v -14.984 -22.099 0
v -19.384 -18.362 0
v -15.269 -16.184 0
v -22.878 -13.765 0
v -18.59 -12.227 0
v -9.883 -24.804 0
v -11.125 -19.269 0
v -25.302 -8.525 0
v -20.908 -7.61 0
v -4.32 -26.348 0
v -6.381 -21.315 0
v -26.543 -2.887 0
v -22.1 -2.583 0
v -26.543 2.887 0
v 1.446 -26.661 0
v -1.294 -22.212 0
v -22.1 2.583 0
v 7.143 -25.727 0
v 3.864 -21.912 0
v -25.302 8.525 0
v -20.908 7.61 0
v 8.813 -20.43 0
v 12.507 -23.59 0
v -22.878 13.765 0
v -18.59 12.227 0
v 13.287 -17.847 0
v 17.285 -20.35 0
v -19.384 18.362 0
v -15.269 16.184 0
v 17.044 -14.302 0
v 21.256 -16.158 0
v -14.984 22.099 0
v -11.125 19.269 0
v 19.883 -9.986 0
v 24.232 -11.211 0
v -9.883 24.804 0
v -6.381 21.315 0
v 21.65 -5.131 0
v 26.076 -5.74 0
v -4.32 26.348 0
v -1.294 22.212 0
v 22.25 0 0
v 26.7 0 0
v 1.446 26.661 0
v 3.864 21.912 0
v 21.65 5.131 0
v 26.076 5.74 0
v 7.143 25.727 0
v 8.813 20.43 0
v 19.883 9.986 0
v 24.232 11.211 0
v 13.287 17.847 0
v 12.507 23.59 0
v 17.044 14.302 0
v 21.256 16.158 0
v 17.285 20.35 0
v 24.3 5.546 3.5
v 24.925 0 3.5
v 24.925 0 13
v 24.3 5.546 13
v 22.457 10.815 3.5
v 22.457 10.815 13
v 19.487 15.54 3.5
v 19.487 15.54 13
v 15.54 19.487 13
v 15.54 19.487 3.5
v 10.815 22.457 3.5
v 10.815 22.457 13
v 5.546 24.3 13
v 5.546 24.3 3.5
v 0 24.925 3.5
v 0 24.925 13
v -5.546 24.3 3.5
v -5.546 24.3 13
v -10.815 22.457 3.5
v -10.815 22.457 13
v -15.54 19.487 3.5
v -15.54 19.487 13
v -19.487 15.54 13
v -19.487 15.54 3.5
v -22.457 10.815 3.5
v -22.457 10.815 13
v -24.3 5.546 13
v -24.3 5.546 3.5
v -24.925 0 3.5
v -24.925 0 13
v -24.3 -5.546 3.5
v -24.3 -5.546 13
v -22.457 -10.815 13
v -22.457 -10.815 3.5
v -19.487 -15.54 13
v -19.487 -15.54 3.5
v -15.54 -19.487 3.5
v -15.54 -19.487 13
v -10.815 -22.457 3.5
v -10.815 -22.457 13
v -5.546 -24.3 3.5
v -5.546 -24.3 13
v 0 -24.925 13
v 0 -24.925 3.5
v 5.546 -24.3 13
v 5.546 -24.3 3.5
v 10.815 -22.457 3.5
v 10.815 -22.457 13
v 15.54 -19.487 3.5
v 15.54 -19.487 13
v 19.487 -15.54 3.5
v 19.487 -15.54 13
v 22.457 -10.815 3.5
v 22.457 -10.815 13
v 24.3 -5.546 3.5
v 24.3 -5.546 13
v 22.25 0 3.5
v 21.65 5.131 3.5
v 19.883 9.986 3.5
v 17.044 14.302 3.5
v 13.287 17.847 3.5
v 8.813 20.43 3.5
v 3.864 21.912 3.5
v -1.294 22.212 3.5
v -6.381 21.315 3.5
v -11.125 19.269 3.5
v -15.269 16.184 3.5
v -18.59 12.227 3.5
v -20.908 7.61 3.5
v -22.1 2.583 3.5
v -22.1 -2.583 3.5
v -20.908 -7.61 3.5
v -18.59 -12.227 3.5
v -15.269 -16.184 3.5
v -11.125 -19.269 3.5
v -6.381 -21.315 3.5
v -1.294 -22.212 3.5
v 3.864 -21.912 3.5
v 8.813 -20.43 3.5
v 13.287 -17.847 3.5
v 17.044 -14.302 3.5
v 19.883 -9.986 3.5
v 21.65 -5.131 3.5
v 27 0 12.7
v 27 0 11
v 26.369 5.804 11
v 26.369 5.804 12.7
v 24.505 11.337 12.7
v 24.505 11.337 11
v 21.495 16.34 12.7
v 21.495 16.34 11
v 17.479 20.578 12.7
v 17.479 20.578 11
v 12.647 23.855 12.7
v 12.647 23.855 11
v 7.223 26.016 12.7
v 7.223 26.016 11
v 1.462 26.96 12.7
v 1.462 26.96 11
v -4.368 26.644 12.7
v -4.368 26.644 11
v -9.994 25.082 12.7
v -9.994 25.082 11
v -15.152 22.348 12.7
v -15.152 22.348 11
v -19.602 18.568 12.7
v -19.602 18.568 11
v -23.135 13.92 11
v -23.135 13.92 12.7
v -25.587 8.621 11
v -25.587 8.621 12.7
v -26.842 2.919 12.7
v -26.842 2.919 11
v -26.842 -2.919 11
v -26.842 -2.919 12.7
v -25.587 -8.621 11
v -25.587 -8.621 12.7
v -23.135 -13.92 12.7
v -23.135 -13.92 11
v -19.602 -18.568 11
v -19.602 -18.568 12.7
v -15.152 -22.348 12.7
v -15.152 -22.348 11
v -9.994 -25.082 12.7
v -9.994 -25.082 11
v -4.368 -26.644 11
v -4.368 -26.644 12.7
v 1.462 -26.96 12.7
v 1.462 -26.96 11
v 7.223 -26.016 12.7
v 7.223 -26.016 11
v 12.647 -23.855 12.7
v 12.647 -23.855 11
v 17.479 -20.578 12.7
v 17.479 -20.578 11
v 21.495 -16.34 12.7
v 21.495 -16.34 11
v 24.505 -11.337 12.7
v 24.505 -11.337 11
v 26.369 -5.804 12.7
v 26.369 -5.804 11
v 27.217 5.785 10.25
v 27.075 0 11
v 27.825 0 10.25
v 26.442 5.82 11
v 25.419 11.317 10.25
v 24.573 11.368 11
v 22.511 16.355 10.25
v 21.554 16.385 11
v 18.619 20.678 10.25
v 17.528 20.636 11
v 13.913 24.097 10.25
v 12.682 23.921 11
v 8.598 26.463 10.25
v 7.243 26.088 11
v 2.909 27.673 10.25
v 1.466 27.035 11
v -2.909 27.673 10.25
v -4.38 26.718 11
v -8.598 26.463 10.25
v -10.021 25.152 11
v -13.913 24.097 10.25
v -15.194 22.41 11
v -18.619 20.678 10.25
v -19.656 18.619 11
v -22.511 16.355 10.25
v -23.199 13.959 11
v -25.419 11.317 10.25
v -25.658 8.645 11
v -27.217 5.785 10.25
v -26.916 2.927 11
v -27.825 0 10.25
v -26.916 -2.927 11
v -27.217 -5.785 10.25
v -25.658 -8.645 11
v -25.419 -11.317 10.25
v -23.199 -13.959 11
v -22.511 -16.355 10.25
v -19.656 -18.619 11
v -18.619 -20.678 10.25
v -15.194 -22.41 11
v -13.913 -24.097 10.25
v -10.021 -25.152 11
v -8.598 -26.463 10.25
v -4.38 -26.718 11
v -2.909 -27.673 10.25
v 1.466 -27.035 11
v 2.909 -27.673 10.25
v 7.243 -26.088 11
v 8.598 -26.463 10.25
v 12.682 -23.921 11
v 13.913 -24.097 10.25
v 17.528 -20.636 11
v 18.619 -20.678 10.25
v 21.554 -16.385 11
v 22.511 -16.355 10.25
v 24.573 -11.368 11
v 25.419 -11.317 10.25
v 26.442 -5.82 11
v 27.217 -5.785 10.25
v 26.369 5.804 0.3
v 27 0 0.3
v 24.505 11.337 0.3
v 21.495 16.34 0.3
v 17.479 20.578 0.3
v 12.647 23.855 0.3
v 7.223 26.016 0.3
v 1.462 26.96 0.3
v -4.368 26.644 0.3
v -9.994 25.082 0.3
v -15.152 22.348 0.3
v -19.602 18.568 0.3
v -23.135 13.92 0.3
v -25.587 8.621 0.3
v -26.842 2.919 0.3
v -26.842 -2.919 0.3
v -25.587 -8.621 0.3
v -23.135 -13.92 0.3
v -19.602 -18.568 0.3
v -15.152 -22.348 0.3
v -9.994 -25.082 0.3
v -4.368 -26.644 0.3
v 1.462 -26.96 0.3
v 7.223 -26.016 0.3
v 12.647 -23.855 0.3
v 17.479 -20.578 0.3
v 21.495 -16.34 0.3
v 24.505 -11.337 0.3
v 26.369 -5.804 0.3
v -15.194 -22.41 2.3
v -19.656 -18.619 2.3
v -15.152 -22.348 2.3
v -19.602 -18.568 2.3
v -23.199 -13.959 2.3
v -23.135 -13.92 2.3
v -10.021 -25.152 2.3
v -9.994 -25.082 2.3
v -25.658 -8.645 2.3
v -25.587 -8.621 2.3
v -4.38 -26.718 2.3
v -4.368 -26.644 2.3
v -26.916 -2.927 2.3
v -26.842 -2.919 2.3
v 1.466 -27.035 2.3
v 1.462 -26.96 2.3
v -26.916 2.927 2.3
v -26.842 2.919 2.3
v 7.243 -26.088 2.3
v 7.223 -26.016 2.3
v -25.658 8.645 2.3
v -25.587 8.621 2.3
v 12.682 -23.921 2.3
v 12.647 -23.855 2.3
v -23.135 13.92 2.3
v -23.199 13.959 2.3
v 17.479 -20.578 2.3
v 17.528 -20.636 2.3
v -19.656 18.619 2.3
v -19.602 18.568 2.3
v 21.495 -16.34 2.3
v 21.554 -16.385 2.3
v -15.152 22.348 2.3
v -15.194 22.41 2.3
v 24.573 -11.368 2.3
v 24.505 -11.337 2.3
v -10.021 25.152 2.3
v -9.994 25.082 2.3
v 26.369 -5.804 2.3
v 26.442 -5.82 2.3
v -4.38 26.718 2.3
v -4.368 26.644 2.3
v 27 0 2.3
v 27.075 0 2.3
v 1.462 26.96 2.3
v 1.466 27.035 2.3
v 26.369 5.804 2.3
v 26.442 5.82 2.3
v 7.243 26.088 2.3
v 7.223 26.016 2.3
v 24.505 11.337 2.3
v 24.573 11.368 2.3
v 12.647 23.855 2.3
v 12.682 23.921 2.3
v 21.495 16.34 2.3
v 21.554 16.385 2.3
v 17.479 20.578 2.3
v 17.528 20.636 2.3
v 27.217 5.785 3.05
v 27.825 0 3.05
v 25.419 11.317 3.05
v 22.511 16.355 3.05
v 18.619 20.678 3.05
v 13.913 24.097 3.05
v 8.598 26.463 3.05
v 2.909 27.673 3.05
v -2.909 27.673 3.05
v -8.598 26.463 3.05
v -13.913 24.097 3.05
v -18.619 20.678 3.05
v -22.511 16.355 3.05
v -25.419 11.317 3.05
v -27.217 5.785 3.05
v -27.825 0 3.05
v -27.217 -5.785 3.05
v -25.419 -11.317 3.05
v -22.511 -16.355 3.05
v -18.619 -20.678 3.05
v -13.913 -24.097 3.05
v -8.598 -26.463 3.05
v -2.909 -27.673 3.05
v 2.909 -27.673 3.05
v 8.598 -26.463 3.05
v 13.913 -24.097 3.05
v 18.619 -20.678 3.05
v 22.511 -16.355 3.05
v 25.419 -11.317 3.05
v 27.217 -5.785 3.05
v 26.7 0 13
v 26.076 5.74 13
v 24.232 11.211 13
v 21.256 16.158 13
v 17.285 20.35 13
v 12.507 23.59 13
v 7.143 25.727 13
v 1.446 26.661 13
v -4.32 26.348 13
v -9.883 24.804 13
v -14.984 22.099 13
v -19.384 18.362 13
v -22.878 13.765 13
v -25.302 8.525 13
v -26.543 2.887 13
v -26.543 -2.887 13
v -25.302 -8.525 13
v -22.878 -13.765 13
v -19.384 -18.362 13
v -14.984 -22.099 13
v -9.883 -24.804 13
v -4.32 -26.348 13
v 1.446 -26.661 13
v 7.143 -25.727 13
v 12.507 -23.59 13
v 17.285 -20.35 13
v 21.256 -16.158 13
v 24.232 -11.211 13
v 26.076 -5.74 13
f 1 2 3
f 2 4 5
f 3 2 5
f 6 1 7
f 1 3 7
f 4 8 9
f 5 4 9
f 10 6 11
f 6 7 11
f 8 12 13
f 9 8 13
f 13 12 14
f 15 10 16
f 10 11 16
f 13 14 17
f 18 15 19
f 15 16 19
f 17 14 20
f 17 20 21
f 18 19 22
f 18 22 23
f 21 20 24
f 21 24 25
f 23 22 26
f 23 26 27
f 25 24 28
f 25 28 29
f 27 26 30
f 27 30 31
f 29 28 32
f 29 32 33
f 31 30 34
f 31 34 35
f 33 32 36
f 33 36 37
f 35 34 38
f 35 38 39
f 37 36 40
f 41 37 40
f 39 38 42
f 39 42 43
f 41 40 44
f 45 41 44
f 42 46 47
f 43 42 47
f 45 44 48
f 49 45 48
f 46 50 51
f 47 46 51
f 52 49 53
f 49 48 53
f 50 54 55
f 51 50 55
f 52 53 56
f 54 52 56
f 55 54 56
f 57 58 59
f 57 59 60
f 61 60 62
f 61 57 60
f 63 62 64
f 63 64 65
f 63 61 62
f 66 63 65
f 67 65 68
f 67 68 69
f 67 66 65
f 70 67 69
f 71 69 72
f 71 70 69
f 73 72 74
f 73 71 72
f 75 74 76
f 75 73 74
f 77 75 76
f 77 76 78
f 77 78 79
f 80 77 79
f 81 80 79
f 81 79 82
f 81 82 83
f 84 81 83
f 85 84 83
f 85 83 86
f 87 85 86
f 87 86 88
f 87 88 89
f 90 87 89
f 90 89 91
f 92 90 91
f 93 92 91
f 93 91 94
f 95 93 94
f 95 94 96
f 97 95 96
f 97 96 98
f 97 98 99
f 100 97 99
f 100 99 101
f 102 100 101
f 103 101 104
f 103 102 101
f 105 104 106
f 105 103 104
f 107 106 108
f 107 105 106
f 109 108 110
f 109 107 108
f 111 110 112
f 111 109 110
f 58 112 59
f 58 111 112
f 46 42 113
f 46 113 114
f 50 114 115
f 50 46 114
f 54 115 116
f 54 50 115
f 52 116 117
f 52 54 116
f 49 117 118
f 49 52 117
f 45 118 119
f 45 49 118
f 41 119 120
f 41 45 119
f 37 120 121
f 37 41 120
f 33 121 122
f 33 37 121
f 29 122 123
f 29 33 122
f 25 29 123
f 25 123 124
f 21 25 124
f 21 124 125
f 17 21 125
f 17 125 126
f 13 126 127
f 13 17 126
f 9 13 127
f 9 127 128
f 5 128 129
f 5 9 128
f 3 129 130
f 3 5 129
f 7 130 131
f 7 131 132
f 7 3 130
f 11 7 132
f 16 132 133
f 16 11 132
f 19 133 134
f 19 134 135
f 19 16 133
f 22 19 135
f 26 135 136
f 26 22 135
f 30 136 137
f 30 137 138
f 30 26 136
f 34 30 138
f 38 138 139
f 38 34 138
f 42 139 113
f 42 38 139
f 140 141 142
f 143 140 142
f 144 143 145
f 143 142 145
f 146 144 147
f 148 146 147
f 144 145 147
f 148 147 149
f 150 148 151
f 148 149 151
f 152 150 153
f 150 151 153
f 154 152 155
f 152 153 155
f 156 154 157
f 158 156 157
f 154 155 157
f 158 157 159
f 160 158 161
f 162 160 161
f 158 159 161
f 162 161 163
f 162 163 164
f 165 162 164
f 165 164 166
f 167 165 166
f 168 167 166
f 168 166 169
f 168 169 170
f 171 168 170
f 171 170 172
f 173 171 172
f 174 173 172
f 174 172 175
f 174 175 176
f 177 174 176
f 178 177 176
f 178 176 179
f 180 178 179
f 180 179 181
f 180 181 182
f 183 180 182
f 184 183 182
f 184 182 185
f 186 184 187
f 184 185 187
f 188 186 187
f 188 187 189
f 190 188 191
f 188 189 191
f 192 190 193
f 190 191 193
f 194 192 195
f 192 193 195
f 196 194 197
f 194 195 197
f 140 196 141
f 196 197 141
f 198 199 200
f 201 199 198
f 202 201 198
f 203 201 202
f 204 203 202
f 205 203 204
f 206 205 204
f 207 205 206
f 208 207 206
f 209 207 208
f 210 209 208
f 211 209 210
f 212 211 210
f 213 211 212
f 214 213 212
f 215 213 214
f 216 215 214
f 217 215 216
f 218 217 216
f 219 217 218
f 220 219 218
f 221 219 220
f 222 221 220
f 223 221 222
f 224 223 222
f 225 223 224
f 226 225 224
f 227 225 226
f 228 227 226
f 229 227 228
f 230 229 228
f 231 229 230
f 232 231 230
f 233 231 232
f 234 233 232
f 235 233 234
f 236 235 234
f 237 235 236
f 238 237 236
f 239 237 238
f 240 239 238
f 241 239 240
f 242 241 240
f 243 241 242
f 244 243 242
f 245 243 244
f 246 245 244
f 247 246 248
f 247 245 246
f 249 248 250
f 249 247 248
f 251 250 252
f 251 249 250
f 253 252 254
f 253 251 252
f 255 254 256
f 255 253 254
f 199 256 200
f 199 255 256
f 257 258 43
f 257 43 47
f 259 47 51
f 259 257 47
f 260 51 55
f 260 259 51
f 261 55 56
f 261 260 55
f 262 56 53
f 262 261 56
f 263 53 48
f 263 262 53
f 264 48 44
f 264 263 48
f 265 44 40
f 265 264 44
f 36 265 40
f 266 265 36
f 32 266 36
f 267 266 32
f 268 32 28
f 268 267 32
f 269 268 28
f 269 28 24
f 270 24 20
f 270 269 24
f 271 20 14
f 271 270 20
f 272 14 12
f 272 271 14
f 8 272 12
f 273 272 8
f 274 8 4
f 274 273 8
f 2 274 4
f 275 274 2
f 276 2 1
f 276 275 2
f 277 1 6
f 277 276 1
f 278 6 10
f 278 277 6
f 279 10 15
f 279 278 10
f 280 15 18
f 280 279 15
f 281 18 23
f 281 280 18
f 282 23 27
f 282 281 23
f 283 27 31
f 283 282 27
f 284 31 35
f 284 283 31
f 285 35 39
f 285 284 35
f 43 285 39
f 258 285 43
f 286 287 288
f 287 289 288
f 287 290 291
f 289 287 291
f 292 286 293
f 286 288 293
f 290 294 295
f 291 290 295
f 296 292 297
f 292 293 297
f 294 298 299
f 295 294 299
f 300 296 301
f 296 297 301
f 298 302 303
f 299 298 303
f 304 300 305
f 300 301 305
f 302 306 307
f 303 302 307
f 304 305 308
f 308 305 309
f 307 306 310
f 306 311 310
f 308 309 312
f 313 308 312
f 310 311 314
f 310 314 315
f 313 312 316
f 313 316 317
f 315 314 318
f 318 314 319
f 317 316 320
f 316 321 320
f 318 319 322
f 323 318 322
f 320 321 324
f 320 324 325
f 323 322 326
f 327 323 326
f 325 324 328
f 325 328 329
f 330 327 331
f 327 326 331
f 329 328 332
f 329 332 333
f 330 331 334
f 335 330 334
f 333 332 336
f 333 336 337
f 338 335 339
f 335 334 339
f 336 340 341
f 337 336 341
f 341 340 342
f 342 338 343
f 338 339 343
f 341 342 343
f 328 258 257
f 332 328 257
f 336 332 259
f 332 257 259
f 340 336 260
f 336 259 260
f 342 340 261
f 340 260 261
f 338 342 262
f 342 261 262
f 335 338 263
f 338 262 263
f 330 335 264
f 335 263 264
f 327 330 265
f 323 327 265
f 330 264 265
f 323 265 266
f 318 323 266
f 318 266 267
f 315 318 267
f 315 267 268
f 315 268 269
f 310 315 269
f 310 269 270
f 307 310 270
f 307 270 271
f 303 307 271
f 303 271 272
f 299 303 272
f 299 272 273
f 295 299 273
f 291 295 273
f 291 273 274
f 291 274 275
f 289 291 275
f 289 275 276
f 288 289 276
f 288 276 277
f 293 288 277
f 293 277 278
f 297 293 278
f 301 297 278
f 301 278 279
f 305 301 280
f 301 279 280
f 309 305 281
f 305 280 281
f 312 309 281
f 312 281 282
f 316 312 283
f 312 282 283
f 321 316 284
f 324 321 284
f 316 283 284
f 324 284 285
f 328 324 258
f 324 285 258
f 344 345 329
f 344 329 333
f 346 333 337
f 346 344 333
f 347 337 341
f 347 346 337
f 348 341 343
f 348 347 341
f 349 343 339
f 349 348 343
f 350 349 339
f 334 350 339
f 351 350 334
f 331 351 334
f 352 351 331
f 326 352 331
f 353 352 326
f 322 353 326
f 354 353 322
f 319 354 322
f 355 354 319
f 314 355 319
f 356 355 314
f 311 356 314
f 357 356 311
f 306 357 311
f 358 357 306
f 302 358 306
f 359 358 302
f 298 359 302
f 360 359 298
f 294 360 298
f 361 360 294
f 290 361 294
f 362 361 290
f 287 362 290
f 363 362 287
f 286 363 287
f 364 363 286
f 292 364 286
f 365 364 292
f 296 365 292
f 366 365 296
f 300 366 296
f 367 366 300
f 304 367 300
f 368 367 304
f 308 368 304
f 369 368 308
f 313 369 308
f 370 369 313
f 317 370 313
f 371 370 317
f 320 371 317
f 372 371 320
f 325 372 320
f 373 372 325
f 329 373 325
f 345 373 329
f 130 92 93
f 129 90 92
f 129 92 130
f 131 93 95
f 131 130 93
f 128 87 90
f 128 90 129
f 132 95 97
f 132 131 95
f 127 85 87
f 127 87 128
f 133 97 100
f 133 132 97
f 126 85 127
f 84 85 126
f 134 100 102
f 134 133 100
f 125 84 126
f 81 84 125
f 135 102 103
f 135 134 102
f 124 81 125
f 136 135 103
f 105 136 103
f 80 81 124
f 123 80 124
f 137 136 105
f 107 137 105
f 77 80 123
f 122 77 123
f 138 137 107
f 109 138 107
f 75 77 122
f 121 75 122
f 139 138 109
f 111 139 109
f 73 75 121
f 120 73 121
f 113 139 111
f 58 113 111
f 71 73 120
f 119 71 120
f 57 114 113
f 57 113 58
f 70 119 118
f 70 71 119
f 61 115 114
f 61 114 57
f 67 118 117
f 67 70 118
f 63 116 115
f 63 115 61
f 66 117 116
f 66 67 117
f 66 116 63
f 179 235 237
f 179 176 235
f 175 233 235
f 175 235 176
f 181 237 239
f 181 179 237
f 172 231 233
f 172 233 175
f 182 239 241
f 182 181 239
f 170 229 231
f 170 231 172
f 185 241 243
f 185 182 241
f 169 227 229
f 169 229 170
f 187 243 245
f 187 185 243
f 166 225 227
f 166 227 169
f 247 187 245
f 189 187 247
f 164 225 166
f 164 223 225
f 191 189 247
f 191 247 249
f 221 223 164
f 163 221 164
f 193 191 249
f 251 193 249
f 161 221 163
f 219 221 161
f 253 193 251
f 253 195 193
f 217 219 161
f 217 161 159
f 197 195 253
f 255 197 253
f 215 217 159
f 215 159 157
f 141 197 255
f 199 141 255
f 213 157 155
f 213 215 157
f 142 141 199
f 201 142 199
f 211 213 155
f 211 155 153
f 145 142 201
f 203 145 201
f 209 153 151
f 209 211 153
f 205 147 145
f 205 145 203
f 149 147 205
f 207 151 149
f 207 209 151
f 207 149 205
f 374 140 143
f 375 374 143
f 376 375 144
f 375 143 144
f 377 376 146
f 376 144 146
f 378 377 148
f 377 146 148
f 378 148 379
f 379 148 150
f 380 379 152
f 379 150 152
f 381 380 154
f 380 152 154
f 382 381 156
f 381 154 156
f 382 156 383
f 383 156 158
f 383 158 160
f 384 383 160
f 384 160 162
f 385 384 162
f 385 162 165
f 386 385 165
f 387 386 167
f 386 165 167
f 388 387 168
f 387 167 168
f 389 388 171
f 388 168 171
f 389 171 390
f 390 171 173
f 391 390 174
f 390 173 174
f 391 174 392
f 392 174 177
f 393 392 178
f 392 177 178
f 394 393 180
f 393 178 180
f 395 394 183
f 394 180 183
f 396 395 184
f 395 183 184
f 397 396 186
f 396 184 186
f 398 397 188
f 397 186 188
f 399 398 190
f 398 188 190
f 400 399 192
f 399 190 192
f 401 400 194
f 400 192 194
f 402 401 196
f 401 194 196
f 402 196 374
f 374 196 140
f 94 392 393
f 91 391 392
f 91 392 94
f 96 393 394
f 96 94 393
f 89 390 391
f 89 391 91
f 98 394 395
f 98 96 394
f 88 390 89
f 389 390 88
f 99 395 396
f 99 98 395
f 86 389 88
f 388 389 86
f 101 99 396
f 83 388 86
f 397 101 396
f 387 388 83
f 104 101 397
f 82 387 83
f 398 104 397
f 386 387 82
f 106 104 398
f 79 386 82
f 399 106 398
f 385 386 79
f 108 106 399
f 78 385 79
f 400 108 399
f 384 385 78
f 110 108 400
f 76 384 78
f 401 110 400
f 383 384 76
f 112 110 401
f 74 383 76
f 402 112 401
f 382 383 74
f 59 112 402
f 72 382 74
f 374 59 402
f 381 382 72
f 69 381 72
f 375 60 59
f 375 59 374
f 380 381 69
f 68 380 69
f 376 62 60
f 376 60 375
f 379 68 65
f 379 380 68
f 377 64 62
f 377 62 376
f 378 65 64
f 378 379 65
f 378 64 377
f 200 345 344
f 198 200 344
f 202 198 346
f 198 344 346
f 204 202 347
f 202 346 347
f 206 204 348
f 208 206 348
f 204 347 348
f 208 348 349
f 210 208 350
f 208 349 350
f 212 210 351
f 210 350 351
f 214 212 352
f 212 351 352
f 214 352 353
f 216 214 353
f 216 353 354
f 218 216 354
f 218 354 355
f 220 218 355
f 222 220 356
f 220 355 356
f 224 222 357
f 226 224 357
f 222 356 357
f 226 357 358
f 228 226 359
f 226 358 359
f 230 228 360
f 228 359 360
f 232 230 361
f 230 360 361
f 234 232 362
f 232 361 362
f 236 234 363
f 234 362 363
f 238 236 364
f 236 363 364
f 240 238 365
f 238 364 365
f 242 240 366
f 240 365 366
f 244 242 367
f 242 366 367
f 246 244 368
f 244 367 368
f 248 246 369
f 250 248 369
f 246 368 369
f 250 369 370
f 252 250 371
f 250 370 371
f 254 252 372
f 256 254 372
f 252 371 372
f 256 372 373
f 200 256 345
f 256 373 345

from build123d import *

# Parameters (mm, degrees)
F0_R     = 27
F0_R_2   = 24.925
F1_DEPTH = 13
F0_R_3   = 22.25
F2_DEPTH = 3.5
F3_START = 2.3
F0_R_4   = 27.825
F3_DEPTH = 8.7
F4_SIZE  = 0.3
F5_SIZE  = 0.75


with BuildPart() as f1:
    # F0 (on Top) → F1 (new body)
    with BuildSketch(Plane.XY):
        Circle(F0_R)
        Circle(F0_R_2, mode=Mode.SUBTRACT)
    extrude(amount=F1_DEPTH)

    # F0 (on Top) → F2 (join)
    with BuildSketch(Plane.XY):
        Circle(F0_R_2)
        Circle(F0_R_3, mode=Mode.SUBTRACT)
    extrude(amount=F2_DEPTH)

    # F0 (on Top) → F3 (join)
    with BuildSketch(Plane.XY.offset(F3_START)):
        Circle(F0_R_4)
        Circle(F0_R, mode=Mode.SUBTRACT)
    extrude(amount=F3_DEPTH)

    # F4
    f4_edges = [f1.edges().sort_by_distance(p)[0] for p in [
        (-27, 0, 13),
        (-27, 0, 0),
    ]]
    chamfer(f4_edges, length=F4_SIZE)

    # F5
    f5_edges = [f1.edges().sort_by_distance(p)[0] for p in [
        (27.825, 0, 6.65),
        (-27.825, 0, 2.3),
        (-27.825, 0, 11),
    ]]
    chamfer(f5_edges, length=F5_SIZE)


solid = f1.part
